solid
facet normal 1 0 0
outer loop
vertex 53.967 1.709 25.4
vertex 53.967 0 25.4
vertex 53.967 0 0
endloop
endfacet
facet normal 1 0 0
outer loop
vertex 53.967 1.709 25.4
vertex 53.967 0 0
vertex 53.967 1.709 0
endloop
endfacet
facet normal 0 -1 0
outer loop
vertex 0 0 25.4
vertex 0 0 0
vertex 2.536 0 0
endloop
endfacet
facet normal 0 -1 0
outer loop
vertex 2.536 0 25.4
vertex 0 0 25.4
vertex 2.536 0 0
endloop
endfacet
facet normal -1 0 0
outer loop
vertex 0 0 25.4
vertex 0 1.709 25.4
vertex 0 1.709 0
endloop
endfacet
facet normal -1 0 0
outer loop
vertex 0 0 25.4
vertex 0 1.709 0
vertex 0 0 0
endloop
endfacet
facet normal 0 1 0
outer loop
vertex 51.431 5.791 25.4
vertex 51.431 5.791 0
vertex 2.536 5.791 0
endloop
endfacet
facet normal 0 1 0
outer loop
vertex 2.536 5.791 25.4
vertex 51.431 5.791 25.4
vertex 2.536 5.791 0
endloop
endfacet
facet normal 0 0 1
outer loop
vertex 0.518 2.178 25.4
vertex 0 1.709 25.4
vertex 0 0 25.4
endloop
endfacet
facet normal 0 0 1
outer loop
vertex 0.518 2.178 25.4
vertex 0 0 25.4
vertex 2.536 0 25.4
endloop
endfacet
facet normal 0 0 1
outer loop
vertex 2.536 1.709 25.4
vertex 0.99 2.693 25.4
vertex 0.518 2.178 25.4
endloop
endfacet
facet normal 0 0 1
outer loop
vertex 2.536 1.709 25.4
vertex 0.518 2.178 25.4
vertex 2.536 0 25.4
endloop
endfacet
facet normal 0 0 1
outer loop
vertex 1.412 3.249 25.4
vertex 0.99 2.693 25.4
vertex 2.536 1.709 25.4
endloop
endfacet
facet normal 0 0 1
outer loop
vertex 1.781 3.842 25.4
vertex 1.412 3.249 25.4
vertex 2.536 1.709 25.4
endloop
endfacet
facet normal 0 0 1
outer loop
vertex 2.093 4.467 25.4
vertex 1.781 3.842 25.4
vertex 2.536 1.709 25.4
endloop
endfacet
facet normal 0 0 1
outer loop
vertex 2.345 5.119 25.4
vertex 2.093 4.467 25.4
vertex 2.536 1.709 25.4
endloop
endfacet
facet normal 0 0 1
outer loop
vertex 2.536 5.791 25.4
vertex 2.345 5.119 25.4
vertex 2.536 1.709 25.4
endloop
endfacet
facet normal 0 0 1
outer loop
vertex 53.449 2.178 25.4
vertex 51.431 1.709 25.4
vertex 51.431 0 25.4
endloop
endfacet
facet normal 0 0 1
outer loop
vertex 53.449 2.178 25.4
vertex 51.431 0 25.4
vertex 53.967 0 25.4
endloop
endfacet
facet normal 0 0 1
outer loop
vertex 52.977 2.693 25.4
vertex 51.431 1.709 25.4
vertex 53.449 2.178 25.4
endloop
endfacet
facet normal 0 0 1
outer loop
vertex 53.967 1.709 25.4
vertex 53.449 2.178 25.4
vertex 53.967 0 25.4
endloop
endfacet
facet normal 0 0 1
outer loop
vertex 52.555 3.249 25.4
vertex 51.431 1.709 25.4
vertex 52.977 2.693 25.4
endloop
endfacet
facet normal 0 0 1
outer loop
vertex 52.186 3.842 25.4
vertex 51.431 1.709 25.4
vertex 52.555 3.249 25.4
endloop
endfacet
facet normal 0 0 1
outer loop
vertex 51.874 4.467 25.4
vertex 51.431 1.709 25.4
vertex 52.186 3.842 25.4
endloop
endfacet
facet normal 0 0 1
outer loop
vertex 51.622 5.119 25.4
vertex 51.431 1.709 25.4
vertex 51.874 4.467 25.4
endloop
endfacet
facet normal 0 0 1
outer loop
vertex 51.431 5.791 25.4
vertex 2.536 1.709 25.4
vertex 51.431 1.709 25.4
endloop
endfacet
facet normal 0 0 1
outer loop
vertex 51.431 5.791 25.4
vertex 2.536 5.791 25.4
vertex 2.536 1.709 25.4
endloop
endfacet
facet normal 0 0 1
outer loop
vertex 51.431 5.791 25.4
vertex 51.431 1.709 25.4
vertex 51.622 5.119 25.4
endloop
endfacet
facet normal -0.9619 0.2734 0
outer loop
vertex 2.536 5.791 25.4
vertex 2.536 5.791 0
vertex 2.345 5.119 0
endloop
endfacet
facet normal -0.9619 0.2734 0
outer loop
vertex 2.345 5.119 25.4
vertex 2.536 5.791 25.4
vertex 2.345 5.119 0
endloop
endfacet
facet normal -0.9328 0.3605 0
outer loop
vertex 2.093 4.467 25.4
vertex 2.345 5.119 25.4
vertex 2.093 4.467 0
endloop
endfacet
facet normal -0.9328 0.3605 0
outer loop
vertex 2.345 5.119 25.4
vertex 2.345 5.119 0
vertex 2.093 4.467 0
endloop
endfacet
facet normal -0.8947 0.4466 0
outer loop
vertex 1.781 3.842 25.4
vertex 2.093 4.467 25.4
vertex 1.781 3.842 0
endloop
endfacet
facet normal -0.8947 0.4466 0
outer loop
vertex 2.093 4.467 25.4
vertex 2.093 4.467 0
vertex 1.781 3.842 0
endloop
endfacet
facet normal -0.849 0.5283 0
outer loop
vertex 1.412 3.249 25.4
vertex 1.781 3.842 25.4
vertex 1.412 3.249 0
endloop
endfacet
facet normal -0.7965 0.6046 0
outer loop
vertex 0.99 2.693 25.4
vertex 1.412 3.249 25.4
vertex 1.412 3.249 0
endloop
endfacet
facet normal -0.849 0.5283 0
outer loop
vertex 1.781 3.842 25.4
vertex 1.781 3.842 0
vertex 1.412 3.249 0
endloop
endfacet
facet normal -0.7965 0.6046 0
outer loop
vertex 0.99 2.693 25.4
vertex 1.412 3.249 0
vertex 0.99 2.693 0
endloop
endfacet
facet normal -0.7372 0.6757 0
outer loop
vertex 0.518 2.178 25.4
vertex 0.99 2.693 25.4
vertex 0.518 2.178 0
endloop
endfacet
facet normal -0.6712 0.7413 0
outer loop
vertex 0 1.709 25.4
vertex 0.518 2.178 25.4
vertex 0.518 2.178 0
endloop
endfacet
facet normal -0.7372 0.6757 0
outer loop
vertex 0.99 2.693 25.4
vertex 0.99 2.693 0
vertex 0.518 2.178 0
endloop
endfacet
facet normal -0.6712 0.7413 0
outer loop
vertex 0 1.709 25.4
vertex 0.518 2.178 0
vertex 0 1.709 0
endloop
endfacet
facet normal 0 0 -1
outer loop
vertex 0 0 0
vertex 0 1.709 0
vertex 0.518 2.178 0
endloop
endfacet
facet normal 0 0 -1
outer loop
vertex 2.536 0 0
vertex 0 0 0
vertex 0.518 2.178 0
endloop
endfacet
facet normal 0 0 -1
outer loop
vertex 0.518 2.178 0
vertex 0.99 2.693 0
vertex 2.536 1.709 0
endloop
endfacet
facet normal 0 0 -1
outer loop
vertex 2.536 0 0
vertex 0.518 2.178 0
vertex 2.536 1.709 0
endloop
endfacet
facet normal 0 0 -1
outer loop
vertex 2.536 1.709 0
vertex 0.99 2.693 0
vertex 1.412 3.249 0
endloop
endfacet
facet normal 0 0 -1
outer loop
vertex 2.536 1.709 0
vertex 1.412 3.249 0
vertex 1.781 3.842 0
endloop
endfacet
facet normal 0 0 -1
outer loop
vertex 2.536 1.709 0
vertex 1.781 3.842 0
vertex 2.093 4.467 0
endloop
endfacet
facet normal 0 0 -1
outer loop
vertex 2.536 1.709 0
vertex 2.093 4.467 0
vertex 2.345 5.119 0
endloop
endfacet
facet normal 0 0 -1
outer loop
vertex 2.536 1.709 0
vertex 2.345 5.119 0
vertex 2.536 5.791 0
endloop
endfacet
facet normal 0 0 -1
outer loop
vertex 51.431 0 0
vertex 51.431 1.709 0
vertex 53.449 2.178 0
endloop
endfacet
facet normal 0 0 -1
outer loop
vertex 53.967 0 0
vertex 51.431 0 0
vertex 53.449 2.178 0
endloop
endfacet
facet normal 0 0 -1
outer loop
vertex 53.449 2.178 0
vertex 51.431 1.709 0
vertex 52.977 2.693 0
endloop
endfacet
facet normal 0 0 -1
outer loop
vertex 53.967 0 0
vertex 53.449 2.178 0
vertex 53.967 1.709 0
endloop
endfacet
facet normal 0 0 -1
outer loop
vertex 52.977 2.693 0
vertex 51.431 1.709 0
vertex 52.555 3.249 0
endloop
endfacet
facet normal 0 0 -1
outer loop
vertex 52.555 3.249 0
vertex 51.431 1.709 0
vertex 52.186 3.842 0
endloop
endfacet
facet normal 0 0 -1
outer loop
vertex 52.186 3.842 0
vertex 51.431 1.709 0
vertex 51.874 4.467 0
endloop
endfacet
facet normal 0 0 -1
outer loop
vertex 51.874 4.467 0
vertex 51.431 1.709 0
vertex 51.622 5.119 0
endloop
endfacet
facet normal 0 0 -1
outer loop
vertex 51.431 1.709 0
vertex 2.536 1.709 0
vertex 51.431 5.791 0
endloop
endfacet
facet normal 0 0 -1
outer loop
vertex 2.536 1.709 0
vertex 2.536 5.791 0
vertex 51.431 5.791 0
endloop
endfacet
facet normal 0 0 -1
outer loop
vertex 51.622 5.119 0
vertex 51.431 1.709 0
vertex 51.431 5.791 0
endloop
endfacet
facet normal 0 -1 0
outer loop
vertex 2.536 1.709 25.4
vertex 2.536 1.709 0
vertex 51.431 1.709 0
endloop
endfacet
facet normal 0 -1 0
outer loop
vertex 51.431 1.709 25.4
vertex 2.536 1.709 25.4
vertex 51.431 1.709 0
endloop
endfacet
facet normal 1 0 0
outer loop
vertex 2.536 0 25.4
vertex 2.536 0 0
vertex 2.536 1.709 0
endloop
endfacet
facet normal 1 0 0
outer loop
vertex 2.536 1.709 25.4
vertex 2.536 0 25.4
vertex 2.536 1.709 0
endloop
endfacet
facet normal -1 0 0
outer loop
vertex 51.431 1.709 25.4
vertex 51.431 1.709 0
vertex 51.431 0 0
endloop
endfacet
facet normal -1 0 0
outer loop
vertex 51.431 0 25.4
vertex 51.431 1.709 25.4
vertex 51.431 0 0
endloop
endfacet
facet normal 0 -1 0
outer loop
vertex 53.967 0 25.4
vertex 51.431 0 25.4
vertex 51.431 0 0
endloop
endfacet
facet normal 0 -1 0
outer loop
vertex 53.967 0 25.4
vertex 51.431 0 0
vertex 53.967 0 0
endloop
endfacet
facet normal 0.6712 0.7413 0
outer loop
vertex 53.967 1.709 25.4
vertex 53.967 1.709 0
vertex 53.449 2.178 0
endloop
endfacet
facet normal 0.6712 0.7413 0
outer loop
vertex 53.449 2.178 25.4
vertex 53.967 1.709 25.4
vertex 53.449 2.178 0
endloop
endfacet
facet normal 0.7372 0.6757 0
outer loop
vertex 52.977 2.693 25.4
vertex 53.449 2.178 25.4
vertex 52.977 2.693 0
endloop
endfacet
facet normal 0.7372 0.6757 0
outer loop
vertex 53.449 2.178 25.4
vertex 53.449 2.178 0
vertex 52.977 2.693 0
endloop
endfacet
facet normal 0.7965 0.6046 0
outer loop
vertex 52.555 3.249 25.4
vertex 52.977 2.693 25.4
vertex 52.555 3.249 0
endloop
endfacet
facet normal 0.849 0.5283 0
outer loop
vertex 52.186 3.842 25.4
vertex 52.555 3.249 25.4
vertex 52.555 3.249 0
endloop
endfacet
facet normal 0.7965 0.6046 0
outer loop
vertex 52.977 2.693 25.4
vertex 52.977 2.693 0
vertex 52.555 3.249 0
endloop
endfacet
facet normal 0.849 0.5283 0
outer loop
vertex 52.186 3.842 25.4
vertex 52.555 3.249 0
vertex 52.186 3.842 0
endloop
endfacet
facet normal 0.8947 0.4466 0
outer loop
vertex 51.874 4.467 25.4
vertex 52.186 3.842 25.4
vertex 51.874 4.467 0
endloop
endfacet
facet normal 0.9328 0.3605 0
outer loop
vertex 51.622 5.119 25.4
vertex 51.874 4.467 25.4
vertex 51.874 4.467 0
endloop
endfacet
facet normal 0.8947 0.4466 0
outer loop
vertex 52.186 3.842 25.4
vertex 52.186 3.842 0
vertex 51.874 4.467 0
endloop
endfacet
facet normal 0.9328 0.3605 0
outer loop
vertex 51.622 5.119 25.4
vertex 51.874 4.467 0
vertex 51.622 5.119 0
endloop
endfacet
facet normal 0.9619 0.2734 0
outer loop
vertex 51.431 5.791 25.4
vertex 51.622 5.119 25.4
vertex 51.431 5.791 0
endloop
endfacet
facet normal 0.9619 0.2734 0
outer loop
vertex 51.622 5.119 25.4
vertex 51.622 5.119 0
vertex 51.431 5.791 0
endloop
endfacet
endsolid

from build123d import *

# Parameters (mm, degrees)
F1_DEPTH = 25.4


with BuildPart() as f1:
    # F0 (on Top) → F1 (new body)
    with BuildSketch(Plane.XY):
        with BuildLine():
            Line((0, 1.709418), (0, 0))
            Line((0, 0), (2.536132, 0))
            Line((2.536132, 0), (2.536132, 1.70942))
            Line((2.536132, 1.70942), (51.430943, 1.70942))
            Line((51.430943, 1.70942), (51.430943, 0))
            Line((51.430943, 0), (53.967075, 0))
            Line((53.967075, 0), (53.967075, 1.709418))
            ThreePointArc((53.967075, 1.709418), (52.363333, 3.541403), (51.430943, 5.790582))
            Line((51.430943, 5.790582), (2.536132, 5.790582))
            ThreePointArc((2.536132, 5.790582), (1.603742, 3.541403), (0, 1.709418))
        make_face()
    extrude(amount=F1_DEPTH)


solid = f1.part
